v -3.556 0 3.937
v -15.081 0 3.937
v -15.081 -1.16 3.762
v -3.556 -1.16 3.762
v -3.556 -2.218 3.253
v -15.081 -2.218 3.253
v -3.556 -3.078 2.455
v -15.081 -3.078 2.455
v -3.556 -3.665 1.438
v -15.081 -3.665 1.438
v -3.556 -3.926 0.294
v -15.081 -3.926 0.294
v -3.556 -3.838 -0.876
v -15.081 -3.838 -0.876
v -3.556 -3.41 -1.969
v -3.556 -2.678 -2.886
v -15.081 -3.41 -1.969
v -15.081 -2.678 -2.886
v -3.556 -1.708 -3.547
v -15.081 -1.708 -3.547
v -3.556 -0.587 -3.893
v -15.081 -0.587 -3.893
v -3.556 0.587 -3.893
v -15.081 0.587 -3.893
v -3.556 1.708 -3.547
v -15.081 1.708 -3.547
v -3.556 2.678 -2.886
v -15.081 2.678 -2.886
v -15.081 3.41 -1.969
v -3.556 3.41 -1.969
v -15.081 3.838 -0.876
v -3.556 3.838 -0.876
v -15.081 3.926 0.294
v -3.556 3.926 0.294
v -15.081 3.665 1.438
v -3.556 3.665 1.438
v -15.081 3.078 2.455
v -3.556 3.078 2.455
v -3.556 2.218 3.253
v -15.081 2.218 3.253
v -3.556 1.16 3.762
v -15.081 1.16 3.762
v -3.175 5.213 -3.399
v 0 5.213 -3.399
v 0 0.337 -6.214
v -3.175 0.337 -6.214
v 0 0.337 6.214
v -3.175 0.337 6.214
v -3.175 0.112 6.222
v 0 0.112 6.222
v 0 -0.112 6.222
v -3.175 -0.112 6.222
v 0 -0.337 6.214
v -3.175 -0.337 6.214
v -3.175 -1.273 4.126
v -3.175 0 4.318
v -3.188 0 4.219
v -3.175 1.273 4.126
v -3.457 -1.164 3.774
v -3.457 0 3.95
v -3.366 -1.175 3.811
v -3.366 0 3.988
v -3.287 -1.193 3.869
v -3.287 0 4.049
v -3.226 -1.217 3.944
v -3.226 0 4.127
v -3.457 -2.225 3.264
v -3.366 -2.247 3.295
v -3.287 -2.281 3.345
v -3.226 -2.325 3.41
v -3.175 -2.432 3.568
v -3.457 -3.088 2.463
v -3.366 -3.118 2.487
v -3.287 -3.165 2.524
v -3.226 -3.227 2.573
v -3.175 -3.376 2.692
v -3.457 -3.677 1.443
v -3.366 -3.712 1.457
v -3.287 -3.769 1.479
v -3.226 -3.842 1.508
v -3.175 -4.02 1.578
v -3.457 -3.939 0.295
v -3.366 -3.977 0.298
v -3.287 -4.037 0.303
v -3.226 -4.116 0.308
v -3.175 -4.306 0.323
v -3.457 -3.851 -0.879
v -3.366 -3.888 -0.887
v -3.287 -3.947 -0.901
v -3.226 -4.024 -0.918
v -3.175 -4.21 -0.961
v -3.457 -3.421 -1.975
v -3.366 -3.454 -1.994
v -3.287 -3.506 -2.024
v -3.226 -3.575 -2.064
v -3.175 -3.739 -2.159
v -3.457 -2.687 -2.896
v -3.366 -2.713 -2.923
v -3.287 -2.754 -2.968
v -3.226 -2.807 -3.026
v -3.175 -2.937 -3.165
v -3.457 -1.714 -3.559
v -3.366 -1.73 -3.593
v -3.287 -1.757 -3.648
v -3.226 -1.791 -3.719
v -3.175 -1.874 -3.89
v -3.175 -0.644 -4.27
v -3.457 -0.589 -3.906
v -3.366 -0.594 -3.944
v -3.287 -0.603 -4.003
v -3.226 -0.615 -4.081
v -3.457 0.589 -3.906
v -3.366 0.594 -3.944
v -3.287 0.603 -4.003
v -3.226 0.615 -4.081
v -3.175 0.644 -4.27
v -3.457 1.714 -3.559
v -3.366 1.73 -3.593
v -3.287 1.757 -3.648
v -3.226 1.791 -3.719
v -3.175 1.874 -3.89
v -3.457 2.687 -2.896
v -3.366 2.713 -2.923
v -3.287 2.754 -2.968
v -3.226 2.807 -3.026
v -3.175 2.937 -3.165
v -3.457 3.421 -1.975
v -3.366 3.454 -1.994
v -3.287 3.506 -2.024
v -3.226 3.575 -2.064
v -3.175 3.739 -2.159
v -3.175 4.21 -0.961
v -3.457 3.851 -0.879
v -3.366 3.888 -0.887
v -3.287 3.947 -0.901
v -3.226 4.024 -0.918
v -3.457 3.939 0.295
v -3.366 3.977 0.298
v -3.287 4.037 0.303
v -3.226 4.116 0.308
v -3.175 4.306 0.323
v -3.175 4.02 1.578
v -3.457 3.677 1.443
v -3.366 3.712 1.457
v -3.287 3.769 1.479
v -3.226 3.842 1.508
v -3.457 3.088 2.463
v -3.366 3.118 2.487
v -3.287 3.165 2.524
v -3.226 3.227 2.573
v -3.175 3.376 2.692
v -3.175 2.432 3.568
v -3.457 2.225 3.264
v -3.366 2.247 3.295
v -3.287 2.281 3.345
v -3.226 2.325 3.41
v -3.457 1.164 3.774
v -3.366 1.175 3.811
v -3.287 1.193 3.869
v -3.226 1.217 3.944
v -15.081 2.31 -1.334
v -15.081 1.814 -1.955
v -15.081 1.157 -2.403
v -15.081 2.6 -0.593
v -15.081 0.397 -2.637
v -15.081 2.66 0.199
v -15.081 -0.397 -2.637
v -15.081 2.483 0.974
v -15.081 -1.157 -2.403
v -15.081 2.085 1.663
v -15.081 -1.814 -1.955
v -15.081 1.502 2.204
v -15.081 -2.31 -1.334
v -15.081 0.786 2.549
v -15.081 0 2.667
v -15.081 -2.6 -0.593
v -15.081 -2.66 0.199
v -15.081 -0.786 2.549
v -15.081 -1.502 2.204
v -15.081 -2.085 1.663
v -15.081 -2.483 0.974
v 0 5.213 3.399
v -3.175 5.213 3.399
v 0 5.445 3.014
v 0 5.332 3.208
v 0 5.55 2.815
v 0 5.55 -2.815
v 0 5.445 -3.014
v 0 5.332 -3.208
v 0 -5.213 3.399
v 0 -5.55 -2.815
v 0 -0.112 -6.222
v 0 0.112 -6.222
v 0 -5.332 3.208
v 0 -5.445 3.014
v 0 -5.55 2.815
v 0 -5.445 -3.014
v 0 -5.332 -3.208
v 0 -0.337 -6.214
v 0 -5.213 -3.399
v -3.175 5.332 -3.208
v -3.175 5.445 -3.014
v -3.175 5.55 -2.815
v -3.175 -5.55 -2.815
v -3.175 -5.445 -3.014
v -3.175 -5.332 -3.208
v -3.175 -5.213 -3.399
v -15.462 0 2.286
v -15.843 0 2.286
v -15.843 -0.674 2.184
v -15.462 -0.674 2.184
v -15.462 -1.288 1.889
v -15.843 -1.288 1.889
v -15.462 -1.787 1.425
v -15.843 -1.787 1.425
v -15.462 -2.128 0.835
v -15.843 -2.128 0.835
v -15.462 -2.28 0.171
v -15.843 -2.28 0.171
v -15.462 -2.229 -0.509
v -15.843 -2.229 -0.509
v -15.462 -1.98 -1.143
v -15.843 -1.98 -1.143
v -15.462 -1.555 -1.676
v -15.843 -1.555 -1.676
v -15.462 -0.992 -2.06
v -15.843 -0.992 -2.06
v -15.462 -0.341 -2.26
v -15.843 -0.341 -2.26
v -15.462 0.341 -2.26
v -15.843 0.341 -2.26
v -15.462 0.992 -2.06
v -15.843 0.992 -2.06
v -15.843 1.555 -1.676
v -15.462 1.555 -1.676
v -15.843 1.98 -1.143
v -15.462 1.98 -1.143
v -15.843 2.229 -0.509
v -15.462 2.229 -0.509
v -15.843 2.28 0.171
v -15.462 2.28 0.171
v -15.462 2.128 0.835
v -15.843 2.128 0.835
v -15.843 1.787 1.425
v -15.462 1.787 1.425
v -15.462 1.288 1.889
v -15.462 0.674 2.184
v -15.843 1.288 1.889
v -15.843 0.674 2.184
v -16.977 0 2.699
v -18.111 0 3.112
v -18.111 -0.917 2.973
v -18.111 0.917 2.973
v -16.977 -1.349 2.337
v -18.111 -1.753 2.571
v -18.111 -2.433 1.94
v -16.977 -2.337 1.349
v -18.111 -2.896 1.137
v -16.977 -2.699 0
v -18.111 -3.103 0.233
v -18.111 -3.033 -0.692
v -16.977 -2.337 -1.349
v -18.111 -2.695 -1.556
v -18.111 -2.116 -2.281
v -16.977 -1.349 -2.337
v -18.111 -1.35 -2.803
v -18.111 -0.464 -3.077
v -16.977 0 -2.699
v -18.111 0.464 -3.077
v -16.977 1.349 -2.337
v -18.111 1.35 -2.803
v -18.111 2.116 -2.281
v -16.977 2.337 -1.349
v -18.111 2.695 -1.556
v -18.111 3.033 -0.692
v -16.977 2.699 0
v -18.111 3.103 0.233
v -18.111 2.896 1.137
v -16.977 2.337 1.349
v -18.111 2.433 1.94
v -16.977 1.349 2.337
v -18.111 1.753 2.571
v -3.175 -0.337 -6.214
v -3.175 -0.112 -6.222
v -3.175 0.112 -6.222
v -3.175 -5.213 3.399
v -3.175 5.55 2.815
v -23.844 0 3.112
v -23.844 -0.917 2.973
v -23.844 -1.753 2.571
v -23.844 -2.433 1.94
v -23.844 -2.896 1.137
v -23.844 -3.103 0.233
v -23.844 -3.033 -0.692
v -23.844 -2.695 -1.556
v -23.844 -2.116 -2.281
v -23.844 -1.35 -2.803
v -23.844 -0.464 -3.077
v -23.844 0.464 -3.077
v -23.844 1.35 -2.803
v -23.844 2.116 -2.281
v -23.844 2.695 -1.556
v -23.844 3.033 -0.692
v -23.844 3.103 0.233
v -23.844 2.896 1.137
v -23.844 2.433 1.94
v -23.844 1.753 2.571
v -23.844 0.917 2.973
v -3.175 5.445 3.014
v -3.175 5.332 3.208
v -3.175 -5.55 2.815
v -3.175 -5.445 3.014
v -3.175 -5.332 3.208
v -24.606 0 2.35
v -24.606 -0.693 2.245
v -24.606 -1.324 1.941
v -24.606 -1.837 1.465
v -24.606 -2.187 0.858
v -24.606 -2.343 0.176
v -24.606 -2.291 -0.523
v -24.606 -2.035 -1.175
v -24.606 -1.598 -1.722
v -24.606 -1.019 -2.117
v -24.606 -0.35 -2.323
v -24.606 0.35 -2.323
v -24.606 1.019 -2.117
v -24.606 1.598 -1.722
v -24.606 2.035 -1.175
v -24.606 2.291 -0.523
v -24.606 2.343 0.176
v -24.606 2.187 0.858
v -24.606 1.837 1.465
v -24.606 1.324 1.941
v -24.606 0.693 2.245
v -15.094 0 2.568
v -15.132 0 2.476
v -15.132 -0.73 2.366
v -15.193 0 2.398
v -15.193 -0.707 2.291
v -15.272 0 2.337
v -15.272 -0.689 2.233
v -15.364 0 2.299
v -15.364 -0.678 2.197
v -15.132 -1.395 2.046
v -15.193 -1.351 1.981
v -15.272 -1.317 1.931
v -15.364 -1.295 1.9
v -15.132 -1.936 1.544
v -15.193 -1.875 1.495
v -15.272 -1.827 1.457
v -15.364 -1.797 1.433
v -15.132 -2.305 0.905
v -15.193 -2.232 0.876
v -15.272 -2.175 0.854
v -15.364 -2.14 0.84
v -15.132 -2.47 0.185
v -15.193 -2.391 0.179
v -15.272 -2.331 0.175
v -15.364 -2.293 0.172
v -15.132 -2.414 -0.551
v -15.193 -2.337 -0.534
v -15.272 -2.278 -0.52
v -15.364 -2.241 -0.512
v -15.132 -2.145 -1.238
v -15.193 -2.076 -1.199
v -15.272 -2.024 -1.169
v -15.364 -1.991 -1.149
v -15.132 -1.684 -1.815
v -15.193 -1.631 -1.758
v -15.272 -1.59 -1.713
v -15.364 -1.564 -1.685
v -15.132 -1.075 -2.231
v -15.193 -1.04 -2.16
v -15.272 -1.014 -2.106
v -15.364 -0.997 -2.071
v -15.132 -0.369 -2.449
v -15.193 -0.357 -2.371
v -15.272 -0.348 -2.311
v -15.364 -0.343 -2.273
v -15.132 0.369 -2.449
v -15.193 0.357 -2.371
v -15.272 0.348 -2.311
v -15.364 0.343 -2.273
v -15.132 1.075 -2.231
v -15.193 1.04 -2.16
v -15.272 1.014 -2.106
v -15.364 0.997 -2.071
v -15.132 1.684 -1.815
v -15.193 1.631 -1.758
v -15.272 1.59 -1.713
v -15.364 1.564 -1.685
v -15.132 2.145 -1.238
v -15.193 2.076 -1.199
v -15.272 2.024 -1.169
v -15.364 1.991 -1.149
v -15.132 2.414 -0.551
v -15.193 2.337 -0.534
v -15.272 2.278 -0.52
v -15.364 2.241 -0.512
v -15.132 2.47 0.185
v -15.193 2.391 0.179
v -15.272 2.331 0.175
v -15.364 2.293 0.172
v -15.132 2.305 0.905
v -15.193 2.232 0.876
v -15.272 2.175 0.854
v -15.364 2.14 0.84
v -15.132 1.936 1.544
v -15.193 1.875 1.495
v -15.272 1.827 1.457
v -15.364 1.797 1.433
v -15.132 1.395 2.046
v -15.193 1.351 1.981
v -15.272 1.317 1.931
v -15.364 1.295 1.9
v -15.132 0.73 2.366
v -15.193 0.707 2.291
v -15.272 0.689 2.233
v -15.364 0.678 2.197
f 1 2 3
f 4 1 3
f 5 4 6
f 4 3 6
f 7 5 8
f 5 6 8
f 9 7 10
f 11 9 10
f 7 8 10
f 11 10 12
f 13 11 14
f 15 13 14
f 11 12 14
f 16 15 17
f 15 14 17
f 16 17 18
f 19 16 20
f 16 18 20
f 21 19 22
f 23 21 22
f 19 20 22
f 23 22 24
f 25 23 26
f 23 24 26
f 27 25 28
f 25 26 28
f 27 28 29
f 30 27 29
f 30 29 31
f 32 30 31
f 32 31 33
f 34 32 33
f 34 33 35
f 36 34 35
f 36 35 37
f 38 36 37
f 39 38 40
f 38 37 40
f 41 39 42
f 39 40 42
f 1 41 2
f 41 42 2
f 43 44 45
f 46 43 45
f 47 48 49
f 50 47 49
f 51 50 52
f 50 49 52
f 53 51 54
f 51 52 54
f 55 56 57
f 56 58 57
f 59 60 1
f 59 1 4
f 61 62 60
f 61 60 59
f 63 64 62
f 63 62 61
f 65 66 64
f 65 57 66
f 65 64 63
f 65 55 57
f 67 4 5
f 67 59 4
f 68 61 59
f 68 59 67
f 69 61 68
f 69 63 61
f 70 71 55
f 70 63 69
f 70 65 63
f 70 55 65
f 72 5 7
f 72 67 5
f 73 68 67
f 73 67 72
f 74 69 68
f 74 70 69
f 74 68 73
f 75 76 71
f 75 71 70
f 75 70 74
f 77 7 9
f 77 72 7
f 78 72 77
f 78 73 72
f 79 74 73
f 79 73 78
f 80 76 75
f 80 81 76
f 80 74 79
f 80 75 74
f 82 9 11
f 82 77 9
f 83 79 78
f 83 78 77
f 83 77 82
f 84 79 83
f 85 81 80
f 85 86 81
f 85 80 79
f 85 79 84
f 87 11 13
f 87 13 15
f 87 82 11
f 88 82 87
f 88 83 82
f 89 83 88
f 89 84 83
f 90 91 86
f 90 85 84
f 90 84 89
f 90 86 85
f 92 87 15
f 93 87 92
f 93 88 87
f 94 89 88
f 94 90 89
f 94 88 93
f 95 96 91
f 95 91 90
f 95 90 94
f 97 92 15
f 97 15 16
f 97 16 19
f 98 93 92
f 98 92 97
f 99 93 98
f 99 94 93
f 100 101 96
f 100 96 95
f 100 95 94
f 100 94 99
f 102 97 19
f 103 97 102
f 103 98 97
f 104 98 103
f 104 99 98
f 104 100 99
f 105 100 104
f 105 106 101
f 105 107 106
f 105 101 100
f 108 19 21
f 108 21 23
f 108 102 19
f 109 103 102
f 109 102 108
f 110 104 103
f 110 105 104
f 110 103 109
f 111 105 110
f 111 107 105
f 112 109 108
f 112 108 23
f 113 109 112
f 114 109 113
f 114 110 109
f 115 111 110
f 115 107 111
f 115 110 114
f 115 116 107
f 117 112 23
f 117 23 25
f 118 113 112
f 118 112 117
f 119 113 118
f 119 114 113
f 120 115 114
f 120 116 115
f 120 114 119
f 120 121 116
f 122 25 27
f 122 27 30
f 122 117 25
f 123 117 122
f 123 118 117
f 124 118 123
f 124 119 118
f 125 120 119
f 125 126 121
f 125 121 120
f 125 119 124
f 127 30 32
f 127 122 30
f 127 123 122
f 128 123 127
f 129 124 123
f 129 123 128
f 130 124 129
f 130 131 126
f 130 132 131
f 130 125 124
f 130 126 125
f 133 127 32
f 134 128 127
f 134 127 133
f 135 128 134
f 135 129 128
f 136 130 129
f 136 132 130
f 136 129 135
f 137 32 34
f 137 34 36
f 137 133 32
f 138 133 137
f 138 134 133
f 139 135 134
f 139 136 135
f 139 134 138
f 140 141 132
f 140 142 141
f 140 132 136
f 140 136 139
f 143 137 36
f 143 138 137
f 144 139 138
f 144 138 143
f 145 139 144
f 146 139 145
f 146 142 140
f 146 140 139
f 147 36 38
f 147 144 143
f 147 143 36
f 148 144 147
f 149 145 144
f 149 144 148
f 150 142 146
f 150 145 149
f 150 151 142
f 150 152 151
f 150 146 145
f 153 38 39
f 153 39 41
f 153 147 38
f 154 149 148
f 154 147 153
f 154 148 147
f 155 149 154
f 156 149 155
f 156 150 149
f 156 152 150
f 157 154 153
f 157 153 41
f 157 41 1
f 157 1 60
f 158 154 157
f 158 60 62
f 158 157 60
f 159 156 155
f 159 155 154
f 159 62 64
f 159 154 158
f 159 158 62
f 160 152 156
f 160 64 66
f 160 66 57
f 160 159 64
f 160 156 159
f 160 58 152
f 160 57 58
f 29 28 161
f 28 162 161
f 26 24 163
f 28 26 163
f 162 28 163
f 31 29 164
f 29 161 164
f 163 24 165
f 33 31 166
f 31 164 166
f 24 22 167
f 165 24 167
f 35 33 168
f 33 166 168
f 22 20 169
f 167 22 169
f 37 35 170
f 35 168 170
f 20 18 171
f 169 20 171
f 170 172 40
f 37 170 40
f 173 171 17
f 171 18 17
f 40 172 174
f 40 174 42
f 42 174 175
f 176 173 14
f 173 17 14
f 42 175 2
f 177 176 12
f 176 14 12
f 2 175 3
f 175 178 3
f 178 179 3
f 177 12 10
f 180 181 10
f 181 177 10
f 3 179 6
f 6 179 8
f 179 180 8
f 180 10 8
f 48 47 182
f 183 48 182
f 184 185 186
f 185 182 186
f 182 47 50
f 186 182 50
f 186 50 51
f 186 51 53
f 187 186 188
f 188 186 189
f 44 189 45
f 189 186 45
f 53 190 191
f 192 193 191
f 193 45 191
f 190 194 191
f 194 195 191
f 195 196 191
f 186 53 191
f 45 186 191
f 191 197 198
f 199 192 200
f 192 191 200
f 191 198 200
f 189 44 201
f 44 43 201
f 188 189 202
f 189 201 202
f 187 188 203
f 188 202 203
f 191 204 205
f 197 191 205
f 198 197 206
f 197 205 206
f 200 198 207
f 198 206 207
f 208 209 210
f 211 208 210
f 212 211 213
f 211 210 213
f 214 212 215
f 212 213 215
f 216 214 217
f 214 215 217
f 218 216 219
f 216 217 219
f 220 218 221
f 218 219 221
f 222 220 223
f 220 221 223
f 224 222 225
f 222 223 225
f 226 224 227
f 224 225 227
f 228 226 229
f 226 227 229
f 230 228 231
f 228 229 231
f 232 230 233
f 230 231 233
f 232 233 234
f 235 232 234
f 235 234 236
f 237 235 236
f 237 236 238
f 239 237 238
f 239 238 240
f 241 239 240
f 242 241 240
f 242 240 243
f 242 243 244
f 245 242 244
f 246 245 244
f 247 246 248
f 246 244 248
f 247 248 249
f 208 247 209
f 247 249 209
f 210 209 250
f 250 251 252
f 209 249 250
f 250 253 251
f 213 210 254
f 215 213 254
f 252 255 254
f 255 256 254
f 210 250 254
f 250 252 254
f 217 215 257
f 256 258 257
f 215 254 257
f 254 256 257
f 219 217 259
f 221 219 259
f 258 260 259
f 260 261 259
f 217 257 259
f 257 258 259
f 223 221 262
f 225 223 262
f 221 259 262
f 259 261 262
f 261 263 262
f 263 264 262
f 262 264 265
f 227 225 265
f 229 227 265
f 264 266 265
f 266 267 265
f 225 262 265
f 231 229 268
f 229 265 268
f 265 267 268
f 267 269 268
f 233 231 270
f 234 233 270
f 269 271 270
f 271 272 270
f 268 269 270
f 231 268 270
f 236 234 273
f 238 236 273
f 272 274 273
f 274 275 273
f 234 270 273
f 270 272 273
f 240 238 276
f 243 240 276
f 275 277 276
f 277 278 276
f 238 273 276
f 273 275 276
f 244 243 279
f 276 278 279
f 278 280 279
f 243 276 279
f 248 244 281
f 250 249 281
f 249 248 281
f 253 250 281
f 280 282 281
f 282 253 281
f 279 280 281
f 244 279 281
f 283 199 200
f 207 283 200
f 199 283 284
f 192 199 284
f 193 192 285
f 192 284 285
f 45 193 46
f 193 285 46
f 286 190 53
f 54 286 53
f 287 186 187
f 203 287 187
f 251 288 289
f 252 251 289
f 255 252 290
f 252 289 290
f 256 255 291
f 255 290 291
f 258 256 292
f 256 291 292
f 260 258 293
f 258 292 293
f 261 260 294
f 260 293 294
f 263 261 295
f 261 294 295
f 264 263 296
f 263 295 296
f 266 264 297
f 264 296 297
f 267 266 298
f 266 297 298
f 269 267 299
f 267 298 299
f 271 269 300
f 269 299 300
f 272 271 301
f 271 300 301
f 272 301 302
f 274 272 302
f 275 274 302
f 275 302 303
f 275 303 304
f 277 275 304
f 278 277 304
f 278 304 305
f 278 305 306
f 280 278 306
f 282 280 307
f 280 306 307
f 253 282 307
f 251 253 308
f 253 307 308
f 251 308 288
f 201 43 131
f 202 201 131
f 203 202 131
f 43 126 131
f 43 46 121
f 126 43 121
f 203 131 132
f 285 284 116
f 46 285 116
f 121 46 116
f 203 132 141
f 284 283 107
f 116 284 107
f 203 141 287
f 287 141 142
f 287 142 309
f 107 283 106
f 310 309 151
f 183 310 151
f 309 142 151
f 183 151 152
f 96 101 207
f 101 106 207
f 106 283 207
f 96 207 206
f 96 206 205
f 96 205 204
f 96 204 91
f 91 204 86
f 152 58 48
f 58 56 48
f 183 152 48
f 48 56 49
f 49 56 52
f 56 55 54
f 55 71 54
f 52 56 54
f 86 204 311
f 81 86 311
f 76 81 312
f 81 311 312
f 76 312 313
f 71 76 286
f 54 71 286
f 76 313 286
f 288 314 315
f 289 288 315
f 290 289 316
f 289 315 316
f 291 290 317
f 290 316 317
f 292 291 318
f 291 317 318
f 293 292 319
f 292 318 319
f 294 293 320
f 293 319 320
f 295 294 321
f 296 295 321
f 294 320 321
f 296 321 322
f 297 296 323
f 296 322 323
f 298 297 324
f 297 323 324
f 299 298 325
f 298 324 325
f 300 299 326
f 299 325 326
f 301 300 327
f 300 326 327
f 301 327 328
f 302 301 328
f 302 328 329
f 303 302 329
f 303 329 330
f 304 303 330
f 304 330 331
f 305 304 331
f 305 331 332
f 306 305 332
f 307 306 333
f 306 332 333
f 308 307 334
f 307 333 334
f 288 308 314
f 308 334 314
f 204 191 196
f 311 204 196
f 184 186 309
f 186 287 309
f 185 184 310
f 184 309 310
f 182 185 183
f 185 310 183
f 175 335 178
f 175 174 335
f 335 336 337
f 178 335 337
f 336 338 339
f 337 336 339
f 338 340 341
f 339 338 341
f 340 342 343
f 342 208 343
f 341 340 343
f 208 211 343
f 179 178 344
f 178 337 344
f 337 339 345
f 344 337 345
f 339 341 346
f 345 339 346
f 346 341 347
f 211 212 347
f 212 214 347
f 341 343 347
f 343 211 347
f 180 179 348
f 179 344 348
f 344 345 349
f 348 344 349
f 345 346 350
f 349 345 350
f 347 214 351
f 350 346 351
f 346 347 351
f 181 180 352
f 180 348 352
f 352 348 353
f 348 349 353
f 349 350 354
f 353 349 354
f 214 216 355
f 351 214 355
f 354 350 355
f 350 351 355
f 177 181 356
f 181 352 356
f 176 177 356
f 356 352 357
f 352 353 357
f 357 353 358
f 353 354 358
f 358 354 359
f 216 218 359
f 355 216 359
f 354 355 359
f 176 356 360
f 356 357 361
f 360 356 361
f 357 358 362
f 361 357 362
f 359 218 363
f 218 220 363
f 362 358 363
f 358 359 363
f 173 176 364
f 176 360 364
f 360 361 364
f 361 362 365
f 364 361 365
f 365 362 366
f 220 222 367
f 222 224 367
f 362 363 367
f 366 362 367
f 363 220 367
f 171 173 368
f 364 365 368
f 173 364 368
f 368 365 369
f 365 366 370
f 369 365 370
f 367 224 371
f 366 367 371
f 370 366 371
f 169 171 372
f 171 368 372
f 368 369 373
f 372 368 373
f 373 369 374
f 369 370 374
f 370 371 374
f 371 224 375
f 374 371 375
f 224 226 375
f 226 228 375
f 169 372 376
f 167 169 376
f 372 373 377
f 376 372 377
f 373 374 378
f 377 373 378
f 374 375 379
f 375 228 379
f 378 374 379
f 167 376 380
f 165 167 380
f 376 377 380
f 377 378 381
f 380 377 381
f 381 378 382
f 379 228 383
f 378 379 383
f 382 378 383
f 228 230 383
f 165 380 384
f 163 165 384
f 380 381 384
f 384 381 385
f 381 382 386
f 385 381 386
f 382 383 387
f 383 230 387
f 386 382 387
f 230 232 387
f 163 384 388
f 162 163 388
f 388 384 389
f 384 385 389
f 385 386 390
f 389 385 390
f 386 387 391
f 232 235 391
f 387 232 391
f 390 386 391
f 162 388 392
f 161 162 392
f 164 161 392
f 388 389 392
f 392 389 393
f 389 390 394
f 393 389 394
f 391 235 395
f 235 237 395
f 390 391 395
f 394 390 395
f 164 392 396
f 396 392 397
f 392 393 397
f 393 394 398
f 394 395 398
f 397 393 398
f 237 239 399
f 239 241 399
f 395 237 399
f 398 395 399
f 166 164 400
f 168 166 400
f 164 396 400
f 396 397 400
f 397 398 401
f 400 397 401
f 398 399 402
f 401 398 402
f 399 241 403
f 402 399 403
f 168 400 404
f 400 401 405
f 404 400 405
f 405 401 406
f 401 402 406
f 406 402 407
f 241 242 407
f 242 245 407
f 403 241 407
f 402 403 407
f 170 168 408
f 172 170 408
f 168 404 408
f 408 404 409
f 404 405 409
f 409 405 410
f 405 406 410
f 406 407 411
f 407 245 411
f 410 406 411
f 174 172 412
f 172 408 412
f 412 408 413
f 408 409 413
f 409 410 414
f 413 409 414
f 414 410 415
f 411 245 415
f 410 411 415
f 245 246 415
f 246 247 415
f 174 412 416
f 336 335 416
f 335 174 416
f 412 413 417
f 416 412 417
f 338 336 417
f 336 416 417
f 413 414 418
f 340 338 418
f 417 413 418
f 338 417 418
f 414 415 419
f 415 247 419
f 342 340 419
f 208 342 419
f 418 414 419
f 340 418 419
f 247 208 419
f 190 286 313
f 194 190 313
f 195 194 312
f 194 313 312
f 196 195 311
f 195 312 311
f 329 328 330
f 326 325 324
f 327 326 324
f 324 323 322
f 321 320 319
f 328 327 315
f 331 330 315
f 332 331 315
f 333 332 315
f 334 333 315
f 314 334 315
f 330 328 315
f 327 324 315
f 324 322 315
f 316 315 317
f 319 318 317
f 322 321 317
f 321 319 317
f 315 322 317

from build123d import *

# Parameters (mm, degrees)
F3_DEPTH = 3.175
F4_SIZE  = 0.762
F5_R     = 0.381
F6_R     = 0.381


with BuildPart() as f1:
    # F0 (on Front) → F1 (revolve)
    with BuildSketch(Plane.XZ):
        Polygon((-24.60625, 0), (0, 0), (0, 6.223), (-3.175, 6.223), (-3.175, 3.937), (-15.08125, 3.937), (-15.08125, 2.286), (-15.84325, 2.286), (-18.1112926098, 3.1115), (-24.60625, 3.1115), align=None)
    revolve(axis=Axis((2.7985820894, 0, 0), (1, 0, 0)))

    # F2 (on face) → F3 (cut, through all)
    with BuildSketch(Plane.YZ):
        with BuildLine():
            Line((-5.2128290459, 3.3988442651), (-0.3370709541, 6.2138645119))
            ThreePointArc((-0.3370709541, 6.2138645119), (-3.1115, 5.3892760878), (-5.2128290459, 3.3988442651))
        make_face()
        with BuildLine():
            ThreePointArc((5.2128290459, 3.3988442651), (3.1115, 5.3892760878), (0.3370709541, 6.2138645119))
            Line((0.3370709541, 6.2138645119), (5.2128290459, 3.3988442651))
        make_face()
        with BuildLine():
            ThreePointArc((6.223, 0), (6.0523861699, 1.447187151), (5.5499, 2.8150202468))
            Line((5.5499, 2.8150202468), (5.5499, -2.8150202468))
            ThreePointArc((5.5499, -2.8150202468), (6.0523861699, -1.447187151), (6.223, 0))
        make_face()
        with BuildLine():
            ThreePointArc((0.3370709541, -6.2138645119), (3.1115, -5.3892760878), (5.2128290459, -3.3988442651))
            Line((5.2128290459, -3.3988442651), (0.3370709541, -6.2138645119))
        make_face()
        with BuildLine():
            Line((-0.3370709541, -6.2138645119), (-5.2128290459, -3.3988442651))
            ThreePointArc((-5.2128290459, -3.3988442651), (-3.1115, -5.3892760878), (-0.3370709541, -6.2138645119))
        make_face()
        with BuildLine():
            Line((-5.5499, -2.8150202468), (-5.5499, 2.8150202468))
            ThreePointArc((-5.5499, 2.8150202468), (-6.223, 0), (-5.5499, -2.8150202468))
        make_face()
    extrude(amount=-F3_DEPTH, mode=Mode.SUBTRACT)

    # F4
    f4_edges = [f1.edges().sort_by_distance(p)[0] for p in [
        (-24.60625, 0, -3.1115),
    ]]
    chamfer(f4_edges, length=F4_SIZE)

    # F5
    f5_edges = [f1.edges().sort_by_distance(p)[0] for p in [
        (-3.175, 0, -3.937),
    ]]
    fillet(f5_edges, radius=F5_R)

    # F6
    f6_edges = [f1.edges().sort_by_distance(p)[0] for p in [
        (-15.08125, 0, -2.286),
    ]]
    fillet(f6_edges, radius=F6_R)


solid = f1.part
